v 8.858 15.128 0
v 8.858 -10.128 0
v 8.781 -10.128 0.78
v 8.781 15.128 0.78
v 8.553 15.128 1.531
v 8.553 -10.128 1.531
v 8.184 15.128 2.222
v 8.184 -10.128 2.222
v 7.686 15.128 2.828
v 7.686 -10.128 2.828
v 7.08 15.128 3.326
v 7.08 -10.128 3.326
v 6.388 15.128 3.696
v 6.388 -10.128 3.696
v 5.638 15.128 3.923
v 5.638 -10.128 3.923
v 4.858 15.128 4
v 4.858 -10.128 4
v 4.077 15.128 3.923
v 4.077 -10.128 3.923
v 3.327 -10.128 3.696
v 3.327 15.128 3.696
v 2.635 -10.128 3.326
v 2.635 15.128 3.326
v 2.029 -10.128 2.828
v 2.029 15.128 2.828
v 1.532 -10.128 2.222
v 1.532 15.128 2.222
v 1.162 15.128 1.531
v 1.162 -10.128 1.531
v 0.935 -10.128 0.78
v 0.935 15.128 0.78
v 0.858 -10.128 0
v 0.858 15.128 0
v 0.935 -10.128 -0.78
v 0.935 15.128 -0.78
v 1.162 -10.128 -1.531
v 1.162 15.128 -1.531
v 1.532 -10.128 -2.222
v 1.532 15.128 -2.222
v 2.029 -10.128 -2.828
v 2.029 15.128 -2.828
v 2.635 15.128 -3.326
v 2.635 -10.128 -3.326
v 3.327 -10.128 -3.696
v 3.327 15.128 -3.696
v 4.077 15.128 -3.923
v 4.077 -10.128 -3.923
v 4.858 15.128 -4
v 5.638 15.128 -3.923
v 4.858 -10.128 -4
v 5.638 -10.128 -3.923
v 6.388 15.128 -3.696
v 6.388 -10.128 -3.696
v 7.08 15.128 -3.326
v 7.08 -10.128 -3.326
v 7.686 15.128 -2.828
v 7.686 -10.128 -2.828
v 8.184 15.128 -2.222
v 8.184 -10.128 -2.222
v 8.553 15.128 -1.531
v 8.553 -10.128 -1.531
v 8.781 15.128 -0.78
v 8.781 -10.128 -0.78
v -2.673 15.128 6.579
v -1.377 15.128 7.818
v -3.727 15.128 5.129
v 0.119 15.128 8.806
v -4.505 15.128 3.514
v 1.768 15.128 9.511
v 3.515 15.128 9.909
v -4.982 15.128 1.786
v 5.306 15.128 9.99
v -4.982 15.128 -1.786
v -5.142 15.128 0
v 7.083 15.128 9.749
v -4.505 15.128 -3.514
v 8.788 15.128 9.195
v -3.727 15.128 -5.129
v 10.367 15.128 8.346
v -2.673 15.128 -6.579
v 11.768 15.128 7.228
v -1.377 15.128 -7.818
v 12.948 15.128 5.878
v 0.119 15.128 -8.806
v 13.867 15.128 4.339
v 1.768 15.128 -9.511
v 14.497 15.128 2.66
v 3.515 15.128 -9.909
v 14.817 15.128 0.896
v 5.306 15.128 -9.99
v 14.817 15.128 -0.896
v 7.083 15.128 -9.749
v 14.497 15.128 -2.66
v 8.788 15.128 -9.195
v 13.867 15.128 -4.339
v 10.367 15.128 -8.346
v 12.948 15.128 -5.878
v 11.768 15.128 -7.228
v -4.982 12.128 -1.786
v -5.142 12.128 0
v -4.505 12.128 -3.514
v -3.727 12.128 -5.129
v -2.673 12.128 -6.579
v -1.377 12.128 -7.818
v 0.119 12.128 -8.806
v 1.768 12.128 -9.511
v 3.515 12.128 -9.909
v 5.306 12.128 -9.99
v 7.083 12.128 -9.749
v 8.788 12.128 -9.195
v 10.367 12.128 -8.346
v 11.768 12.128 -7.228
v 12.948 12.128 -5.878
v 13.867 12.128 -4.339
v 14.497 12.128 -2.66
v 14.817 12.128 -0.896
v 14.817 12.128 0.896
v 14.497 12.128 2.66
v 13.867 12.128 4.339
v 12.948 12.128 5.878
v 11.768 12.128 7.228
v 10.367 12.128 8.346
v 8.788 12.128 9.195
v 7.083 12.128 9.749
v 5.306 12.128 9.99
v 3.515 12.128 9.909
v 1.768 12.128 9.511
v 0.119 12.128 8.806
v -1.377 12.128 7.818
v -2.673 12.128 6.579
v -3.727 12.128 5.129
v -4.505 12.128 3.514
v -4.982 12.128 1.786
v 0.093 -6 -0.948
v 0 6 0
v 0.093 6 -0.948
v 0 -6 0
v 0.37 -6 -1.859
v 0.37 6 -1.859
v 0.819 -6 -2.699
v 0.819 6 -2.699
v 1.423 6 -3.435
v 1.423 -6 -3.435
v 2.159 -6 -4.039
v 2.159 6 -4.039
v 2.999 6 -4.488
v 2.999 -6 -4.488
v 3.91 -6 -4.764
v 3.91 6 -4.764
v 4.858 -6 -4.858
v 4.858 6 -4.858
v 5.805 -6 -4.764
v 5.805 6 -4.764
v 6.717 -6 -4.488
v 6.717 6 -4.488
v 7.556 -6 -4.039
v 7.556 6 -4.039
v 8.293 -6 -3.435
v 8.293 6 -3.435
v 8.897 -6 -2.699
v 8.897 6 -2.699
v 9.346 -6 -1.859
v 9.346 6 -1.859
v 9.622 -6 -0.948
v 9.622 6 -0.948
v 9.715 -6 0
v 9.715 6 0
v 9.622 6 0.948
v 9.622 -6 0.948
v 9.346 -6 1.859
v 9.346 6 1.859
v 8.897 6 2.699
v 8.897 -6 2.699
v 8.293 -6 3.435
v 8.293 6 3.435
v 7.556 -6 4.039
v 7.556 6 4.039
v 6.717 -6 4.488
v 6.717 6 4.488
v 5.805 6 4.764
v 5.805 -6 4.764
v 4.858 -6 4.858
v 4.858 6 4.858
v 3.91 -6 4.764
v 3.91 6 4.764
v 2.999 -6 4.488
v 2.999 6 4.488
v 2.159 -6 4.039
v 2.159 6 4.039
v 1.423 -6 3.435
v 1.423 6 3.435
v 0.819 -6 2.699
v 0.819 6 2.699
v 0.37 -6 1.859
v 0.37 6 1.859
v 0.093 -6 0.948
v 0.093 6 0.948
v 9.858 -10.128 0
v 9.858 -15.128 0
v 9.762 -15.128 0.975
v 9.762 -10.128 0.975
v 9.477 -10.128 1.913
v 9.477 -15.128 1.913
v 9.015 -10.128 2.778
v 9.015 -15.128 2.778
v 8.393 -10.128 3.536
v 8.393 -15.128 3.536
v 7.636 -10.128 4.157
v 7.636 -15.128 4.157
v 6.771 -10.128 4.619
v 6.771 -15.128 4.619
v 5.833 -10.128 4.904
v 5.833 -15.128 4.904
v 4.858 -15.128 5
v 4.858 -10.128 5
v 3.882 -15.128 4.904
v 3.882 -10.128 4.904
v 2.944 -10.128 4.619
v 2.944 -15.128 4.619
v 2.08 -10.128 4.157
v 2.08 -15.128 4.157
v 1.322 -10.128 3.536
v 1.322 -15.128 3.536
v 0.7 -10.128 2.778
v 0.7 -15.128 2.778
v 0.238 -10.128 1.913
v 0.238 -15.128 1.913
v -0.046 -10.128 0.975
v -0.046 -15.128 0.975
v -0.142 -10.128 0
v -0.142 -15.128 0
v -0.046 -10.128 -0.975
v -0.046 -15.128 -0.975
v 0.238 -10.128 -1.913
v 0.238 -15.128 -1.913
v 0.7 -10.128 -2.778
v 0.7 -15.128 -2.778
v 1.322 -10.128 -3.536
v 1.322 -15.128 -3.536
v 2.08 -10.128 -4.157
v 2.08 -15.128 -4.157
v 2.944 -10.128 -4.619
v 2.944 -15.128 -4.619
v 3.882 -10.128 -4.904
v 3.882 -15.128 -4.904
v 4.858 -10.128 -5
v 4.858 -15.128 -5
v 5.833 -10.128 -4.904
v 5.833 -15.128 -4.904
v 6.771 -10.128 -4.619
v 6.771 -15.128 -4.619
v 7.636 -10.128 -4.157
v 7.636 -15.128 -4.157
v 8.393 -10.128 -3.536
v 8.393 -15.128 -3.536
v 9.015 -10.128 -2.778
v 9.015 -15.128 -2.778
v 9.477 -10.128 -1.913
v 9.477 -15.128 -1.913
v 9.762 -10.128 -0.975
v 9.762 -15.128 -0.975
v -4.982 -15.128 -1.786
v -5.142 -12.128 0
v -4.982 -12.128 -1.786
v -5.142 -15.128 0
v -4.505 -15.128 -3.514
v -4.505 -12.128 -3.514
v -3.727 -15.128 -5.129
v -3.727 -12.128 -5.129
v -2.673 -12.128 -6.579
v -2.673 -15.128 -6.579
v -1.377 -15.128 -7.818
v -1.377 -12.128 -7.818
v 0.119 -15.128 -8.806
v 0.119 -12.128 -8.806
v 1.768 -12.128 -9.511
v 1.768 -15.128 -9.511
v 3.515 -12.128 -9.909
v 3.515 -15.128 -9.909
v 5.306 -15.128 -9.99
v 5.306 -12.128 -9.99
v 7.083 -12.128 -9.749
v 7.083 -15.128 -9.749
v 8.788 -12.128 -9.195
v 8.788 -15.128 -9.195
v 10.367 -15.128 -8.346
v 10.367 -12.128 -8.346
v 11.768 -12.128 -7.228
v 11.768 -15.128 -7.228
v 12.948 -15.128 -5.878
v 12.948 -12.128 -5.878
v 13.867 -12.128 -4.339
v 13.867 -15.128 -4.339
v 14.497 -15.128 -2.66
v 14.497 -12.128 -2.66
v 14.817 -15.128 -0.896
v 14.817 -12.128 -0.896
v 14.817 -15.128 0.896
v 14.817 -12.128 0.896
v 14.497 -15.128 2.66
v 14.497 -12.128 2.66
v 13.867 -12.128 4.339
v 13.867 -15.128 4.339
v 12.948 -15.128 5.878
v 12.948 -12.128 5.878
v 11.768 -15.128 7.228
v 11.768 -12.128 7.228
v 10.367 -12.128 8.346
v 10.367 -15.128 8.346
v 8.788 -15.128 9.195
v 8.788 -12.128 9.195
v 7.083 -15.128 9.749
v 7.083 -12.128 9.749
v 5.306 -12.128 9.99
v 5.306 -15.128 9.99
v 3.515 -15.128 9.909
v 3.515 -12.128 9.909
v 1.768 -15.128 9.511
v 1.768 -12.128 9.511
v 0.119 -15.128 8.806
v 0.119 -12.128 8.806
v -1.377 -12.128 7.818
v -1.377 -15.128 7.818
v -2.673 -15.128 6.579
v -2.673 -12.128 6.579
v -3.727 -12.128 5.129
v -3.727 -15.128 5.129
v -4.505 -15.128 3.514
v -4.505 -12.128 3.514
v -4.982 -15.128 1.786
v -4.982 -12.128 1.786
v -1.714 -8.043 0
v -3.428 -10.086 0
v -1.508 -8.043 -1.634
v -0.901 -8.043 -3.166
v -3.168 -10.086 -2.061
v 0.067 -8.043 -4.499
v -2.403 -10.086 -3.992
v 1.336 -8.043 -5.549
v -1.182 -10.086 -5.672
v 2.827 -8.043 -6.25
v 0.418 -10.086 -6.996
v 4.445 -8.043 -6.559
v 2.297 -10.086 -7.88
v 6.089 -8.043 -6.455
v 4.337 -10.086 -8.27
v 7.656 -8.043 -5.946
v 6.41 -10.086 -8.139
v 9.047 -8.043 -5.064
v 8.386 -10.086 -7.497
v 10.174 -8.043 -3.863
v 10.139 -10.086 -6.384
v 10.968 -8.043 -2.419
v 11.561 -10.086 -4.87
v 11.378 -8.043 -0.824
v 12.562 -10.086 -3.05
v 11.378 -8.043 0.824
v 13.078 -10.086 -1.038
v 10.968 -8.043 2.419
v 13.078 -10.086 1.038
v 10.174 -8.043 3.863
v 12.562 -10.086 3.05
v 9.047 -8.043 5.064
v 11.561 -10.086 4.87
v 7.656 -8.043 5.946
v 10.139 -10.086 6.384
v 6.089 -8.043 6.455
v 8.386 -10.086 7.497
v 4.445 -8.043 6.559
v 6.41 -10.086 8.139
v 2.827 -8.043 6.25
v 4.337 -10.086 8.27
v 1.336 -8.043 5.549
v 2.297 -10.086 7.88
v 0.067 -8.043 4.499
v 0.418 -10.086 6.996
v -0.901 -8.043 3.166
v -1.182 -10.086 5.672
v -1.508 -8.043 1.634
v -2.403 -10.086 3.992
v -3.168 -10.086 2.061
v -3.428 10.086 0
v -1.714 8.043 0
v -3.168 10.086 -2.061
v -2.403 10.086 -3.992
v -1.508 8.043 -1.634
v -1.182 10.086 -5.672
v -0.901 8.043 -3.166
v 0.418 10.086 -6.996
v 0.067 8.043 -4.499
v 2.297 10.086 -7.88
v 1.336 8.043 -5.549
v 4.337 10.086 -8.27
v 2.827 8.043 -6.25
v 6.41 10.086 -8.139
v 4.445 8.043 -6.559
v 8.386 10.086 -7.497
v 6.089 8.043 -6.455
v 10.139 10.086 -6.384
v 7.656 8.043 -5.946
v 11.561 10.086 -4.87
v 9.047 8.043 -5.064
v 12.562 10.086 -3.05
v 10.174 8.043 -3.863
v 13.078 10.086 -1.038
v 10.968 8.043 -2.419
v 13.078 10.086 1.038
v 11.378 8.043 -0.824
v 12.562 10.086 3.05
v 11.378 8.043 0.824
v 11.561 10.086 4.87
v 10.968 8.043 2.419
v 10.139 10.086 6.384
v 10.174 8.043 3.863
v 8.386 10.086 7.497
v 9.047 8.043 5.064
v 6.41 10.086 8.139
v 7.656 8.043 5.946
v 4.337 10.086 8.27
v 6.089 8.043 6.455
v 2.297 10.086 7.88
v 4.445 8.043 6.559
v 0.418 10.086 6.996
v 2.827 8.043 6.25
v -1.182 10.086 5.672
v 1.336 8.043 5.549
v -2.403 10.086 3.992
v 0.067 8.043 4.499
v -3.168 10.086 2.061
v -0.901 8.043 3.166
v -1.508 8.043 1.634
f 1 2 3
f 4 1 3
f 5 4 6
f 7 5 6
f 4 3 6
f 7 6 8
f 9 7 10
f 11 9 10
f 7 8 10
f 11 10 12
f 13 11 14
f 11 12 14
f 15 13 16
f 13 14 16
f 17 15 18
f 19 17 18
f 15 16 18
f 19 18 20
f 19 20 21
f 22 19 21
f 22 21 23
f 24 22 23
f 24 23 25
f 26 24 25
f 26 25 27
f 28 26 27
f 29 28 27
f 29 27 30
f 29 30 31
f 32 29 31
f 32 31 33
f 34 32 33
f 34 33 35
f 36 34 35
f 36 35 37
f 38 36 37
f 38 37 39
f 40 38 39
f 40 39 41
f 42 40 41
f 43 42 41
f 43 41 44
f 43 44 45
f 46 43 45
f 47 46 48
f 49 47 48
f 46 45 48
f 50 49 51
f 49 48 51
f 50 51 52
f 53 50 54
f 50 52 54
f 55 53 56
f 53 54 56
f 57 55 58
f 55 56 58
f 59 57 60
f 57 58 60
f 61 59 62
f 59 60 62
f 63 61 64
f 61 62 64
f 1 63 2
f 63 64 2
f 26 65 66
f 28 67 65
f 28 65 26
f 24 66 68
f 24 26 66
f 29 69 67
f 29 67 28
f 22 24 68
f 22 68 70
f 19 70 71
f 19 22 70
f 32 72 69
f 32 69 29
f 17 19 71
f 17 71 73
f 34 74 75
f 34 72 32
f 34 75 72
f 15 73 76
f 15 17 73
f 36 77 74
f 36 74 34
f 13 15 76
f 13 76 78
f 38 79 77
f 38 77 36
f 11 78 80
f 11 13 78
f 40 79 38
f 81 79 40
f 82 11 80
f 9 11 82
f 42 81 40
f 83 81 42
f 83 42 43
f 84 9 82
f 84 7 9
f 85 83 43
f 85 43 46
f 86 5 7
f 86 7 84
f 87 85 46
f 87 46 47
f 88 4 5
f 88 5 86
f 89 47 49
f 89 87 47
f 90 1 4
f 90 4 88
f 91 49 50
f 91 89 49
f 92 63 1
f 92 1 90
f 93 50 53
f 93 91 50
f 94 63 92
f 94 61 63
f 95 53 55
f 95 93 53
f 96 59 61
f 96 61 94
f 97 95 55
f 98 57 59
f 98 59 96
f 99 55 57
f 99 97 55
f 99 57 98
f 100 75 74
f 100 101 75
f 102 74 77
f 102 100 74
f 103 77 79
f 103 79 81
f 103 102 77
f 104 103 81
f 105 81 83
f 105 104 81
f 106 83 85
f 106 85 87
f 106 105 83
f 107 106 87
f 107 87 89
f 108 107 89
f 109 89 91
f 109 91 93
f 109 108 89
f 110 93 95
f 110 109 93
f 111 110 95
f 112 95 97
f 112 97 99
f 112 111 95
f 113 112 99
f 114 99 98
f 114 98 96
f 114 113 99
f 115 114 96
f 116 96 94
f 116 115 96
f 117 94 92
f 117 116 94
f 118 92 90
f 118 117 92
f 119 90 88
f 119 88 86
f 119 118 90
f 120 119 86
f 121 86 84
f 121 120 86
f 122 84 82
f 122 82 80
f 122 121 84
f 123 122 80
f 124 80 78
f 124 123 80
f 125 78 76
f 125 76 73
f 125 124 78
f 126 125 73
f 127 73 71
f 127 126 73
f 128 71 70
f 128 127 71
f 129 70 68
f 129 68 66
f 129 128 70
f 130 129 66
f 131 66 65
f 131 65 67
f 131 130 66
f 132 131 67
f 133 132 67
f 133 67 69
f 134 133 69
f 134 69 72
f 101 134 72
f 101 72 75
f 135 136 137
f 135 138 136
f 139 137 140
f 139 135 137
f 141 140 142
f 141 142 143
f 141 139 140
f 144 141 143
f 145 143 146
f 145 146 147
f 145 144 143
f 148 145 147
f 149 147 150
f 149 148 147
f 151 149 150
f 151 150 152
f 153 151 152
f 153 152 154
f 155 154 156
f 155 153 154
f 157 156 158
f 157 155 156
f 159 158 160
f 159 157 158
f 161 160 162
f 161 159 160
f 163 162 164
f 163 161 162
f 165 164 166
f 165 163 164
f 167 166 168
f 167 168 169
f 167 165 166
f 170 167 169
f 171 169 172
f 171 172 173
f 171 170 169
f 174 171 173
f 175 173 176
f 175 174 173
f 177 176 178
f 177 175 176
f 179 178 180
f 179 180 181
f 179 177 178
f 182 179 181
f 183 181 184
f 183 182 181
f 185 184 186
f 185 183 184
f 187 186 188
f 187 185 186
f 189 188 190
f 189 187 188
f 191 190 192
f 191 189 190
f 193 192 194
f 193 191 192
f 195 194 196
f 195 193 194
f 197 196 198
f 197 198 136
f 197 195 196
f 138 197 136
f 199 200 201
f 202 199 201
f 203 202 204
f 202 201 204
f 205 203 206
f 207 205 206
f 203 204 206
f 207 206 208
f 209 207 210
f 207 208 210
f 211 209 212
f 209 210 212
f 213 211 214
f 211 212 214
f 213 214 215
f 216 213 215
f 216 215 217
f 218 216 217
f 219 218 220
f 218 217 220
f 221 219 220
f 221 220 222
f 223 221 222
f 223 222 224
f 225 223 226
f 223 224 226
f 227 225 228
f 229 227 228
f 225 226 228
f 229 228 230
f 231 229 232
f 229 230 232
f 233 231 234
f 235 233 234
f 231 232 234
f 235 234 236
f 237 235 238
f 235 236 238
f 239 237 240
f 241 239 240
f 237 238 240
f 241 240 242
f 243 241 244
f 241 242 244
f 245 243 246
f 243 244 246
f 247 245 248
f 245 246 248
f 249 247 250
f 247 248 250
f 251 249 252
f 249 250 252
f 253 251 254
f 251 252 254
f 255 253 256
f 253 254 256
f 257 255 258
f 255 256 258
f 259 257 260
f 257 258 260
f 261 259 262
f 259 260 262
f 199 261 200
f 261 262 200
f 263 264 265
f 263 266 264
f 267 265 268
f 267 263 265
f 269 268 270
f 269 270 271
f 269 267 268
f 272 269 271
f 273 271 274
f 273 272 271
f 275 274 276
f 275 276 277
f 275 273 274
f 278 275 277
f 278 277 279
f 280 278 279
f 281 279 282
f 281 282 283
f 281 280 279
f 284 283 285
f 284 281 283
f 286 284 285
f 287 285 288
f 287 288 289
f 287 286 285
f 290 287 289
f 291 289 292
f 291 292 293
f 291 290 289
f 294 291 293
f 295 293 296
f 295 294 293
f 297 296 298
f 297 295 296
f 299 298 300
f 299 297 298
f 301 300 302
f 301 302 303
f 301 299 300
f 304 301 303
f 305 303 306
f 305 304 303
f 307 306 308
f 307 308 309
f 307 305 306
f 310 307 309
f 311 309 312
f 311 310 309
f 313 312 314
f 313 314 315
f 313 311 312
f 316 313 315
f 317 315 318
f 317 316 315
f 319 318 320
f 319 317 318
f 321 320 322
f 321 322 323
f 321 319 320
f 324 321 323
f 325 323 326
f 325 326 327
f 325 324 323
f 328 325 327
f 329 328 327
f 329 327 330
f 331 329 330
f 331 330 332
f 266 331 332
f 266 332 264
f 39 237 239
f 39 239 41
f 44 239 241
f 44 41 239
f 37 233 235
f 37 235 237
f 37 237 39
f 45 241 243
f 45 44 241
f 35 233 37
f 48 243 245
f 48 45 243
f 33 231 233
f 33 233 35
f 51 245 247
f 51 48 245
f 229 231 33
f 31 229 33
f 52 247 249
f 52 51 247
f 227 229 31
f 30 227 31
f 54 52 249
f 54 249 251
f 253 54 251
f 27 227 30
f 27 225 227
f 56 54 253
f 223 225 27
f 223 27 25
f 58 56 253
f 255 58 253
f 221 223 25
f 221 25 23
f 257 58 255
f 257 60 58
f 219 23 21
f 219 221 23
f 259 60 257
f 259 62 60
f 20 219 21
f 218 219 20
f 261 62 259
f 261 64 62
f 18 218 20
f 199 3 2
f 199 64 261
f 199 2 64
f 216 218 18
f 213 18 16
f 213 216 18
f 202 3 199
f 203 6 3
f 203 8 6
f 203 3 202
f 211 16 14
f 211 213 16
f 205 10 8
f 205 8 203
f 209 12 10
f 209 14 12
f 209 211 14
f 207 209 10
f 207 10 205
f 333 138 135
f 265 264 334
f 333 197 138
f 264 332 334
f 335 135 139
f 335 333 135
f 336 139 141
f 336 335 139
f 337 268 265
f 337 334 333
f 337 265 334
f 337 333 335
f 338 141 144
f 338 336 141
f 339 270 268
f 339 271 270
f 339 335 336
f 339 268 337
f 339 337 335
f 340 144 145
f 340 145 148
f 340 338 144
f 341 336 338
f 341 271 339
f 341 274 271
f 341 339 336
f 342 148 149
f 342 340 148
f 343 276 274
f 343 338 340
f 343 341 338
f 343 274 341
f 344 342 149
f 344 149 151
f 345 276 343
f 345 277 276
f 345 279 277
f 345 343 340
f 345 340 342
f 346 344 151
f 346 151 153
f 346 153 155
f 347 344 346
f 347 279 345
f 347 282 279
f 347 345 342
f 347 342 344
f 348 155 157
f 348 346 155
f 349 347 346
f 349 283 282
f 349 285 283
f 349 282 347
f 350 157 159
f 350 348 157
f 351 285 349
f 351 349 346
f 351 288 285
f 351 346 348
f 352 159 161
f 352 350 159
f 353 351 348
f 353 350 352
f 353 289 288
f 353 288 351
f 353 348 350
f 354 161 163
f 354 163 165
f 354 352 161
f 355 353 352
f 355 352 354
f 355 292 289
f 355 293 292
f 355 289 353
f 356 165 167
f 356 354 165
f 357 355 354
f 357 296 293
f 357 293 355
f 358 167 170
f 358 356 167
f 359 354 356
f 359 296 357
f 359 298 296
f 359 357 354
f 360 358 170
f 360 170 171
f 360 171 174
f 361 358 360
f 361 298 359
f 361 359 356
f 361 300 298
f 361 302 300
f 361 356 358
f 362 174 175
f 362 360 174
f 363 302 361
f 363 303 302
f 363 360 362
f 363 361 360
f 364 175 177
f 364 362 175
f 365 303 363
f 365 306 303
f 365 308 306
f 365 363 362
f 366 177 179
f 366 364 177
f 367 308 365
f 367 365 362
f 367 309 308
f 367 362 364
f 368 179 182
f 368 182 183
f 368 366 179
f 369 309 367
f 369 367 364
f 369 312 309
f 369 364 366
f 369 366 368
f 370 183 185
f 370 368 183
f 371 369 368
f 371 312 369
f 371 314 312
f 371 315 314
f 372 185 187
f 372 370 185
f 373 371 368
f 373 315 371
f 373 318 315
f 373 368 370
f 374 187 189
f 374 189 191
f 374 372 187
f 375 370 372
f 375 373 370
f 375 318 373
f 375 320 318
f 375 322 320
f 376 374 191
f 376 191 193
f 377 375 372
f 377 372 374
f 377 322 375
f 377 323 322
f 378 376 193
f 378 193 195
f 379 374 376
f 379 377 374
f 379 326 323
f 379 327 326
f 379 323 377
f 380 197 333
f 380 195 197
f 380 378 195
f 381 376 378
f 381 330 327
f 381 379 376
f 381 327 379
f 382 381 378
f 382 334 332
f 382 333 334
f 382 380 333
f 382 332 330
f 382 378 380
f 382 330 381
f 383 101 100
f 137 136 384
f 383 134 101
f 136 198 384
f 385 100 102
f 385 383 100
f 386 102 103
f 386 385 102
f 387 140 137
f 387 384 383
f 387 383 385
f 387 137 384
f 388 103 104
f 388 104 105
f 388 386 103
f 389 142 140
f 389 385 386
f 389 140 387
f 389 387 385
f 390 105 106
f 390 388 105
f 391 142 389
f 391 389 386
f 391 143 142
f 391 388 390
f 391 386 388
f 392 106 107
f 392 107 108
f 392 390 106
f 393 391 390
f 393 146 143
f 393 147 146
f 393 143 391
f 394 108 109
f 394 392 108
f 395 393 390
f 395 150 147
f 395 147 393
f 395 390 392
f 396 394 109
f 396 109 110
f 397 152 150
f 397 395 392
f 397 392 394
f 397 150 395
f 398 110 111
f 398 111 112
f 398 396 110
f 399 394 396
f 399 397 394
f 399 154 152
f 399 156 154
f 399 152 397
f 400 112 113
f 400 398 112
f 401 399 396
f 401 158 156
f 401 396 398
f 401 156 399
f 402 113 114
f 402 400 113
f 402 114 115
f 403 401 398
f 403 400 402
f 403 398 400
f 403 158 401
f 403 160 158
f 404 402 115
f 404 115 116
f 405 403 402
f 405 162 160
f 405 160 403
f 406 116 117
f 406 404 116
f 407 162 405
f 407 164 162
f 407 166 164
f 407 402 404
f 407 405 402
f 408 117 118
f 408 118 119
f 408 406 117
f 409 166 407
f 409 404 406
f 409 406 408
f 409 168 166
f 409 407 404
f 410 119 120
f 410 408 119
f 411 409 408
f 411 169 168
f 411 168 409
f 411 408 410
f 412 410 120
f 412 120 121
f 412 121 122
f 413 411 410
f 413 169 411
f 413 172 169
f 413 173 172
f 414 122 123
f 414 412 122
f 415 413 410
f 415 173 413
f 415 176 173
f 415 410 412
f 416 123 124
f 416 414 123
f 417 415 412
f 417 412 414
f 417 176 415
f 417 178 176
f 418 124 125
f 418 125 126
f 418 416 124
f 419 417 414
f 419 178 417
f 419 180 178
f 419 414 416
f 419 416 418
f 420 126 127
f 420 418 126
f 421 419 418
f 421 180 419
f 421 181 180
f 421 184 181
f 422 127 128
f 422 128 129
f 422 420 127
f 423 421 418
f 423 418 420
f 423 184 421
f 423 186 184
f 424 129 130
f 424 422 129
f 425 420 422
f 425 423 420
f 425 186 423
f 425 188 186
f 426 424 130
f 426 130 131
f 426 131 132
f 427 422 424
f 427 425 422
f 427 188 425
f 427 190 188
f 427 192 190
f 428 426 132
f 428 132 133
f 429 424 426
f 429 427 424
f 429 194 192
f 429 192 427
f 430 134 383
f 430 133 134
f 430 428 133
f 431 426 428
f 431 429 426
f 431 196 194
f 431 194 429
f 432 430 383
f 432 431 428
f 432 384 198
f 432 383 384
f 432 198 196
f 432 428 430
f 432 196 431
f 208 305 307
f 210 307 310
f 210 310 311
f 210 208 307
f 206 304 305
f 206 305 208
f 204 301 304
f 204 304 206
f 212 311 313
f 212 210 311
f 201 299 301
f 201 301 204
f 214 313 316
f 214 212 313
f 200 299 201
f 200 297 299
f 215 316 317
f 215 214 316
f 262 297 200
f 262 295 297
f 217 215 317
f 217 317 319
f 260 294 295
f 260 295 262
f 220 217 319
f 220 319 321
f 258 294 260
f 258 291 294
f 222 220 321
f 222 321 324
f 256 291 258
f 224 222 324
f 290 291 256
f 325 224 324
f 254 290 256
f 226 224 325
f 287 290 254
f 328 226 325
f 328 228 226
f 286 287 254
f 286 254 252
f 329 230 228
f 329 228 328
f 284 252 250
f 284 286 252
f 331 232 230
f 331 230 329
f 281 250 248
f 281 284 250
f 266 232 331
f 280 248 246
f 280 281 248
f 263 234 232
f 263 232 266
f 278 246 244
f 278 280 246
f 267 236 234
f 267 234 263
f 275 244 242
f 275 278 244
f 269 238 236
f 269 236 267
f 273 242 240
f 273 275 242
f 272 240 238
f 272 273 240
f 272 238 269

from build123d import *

# Parameters (mm, degrees)
CORTAR_EXTRUIR1_REACH = 37.16
CROQUIS2_R            = 4
CROQUIS3_R            = 5
CORTAR_EXTRUIR2_DEPTH = 5


with BuildPart() as part:
    # Croquis1 → Revolución1 (revolve)
    with BuildSketch(Plane.XY):
        Polygon((0, 6), (0, -6), (-5.142300877, -12.128355545), (-5.142300877, -15.128355545), (4.857699123, -15.128355545), (4.857699123, 15.128355545), (-5.142300877, 15.128355545), (-5.142300877, 12.128355545), align=None)
    revolve(axis=Axis((4.857699123, 15.128355545, 0), (0, -1, 0)))

    # Croquis2 → Cortar-Extruir1 (cut, up to next)
    with BuildSketch(Plane.XZ.offset(15.128355545), mode=Mode.PRIVATE) as cortar_extruir1_sk1:
        with Locations((4.857699123, 0)):
            Circle(CROQUIS2_R)
    cortar_extruir1_tool1 = extrude(cortar_extruir1_sk1.sketch, amount=-CORTAR_EXTRUIR1_REACH, mode=Mode.PRIVATE) & part.part
    add(cortar_extruir1_tool1.solids().sort_by_distance((4.857699, -15.128356, 0))[0], mode=Mode.SUBTRACT)

    # Croquis3 → Cortar-Extruir2 (cut)
    with BuildSketch(Plane.XZ.offset(15.128355545)):
        with Locations((4.857699123, 0)):
            Circle(CROQUIS3_R)
    extrude(amount=-CORTAR_EXTRUIR2_DEPTH, mode=Mode.SUBTRACT)


solid = part.part
